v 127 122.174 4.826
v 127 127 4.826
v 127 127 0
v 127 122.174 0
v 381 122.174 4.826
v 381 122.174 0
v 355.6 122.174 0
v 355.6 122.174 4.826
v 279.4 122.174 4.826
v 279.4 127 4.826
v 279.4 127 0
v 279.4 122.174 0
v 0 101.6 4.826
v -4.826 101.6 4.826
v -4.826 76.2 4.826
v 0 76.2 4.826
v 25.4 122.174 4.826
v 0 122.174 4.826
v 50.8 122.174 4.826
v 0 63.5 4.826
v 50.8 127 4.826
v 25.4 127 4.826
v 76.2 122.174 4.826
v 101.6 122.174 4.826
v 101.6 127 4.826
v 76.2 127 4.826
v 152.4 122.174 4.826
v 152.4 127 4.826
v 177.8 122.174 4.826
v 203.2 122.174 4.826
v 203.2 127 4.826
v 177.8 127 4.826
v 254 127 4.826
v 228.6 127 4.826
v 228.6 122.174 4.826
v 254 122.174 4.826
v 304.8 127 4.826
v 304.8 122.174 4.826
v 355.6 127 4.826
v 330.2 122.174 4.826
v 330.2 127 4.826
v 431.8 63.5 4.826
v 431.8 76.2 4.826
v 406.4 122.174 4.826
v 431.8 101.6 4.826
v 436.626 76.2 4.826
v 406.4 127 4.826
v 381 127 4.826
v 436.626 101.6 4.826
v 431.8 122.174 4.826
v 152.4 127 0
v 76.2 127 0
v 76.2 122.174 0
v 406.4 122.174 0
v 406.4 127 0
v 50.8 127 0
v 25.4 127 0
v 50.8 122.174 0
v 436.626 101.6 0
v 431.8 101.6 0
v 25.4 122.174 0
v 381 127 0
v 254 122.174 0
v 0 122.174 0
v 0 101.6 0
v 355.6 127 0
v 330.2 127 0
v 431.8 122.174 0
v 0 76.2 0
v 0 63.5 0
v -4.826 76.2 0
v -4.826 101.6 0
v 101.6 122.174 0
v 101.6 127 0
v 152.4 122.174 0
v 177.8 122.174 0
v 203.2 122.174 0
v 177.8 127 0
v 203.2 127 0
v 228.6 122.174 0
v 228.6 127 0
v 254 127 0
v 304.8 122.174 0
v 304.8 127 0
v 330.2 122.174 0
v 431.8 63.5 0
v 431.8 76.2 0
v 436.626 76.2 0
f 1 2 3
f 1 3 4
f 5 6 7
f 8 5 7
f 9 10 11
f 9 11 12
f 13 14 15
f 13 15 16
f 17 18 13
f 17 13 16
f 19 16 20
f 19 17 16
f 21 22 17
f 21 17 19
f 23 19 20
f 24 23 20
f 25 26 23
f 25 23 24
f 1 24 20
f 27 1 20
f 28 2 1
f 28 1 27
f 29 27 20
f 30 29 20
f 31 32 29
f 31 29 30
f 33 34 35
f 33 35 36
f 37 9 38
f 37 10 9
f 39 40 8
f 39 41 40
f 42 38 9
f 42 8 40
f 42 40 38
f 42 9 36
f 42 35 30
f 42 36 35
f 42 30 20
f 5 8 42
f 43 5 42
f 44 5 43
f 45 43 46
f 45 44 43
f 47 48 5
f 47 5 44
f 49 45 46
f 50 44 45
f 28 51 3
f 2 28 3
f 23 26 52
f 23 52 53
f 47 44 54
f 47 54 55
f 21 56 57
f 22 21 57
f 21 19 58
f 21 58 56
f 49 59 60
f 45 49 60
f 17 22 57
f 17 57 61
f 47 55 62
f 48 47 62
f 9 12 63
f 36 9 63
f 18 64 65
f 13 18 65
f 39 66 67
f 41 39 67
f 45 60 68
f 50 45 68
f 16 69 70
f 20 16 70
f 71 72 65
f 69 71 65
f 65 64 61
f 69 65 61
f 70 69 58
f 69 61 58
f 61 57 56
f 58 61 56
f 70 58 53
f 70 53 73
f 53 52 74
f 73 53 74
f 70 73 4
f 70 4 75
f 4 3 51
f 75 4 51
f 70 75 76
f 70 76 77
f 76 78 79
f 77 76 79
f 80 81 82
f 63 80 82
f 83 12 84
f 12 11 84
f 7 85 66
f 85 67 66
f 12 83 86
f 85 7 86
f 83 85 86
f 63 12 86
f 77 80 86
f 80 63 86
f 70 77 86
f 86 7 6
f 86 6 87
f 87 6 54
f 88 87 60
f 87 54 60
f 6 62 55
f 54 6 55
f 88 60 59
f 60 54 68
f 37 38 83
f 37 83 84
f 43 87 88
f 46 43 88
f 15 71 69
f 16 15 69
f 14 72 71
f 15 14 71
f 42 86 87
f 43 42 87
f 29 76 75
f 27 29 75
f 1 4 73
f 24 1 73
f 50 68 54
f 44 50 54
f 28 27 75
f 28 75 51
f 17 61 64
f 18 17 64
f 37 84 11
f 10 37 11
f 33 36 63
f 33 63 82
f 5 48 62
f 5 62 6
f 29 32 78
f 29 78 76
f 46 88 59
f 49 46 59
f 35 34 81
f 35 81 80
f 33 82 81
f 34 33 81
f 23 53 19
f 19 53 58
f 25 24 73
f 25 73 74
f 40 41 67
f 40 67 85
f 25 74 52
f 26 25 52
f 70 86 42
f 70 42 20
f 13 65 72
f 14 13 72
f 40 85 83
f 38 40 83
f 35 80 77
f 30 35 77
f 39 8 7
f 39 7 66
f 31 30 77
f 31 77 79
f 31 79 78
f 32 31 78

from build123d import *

# Parameters (mm, degrees)
BOSS_EXTRUDE1_DEPTH = 4.826
SKETCH3_W           = 441.452
SKETCH3_H           = 63.5
CUT_EXTRUDE1_DEPTH  = 5.826


with BuildPart() as part:
    # Sketch2 → Boss-Extrude1 (new body)
    with BuildSketch(Plane.XY):
        Polygon((0, 122.174), (0, 101.6), (-4.826, 101.6), (-4.826, 76.2), (0, 76.2), (0, 50.8), (-4.826, 50.8), (-4.826, 25.4), (0, 25.4), (0, 0), (431.8, 0), (431.8, 25.4), (436.626, 25.4), (436.626, 50.8), (431.8, 50.8), (431.8, 76.2), (436.626, 76.2), (436.626, 101.6), (431.8, 101.6), (431.8, 122.174), (406.4, 122.174), (406.4, 127), (381, 127), (381, 122.174), (355.6, 122.174), (355.6, 127), (330.2, 127), (330.2, 122.174), (304.8, 122.174), (304.8, 127), (279.4, 127), (279.4, 122.174), (254, 122.174), (254, 127), (228.6, 127), (228.6, 122.174), (203.2, 122.174), (203.2, 127), (177.8, 127), (177.8, 122.174), (152.4, 122.174), (152.4, 127), (127, 127), (127, 122.174), (101.6, 122.174), (101.6, 127), (76.2, 127), (76.2, 122.174), (50.8, 122.174), (50.8, 127), (25.4, 127), (25.4, 122.174), align=None)
    extrude(amount=BOSS_EXTRUDE1_DEPTH)

    # Sketch3 → Cut-Extrude1 (cut, through all)
    with BuildSketch(Plane(origin=(0, 0, 0), x_dir=(-1, 0, 0), z_dir=(0, 0, -1))):
        with Locations((-215.9, 31.75)):
            Rectangle(SKETCH3_W, SKETCH3_H)
    extrude(amount=-CUT_EXTRUDE1_DEPTH, mode=Mode.SUBTRACT)


solid = part.part
